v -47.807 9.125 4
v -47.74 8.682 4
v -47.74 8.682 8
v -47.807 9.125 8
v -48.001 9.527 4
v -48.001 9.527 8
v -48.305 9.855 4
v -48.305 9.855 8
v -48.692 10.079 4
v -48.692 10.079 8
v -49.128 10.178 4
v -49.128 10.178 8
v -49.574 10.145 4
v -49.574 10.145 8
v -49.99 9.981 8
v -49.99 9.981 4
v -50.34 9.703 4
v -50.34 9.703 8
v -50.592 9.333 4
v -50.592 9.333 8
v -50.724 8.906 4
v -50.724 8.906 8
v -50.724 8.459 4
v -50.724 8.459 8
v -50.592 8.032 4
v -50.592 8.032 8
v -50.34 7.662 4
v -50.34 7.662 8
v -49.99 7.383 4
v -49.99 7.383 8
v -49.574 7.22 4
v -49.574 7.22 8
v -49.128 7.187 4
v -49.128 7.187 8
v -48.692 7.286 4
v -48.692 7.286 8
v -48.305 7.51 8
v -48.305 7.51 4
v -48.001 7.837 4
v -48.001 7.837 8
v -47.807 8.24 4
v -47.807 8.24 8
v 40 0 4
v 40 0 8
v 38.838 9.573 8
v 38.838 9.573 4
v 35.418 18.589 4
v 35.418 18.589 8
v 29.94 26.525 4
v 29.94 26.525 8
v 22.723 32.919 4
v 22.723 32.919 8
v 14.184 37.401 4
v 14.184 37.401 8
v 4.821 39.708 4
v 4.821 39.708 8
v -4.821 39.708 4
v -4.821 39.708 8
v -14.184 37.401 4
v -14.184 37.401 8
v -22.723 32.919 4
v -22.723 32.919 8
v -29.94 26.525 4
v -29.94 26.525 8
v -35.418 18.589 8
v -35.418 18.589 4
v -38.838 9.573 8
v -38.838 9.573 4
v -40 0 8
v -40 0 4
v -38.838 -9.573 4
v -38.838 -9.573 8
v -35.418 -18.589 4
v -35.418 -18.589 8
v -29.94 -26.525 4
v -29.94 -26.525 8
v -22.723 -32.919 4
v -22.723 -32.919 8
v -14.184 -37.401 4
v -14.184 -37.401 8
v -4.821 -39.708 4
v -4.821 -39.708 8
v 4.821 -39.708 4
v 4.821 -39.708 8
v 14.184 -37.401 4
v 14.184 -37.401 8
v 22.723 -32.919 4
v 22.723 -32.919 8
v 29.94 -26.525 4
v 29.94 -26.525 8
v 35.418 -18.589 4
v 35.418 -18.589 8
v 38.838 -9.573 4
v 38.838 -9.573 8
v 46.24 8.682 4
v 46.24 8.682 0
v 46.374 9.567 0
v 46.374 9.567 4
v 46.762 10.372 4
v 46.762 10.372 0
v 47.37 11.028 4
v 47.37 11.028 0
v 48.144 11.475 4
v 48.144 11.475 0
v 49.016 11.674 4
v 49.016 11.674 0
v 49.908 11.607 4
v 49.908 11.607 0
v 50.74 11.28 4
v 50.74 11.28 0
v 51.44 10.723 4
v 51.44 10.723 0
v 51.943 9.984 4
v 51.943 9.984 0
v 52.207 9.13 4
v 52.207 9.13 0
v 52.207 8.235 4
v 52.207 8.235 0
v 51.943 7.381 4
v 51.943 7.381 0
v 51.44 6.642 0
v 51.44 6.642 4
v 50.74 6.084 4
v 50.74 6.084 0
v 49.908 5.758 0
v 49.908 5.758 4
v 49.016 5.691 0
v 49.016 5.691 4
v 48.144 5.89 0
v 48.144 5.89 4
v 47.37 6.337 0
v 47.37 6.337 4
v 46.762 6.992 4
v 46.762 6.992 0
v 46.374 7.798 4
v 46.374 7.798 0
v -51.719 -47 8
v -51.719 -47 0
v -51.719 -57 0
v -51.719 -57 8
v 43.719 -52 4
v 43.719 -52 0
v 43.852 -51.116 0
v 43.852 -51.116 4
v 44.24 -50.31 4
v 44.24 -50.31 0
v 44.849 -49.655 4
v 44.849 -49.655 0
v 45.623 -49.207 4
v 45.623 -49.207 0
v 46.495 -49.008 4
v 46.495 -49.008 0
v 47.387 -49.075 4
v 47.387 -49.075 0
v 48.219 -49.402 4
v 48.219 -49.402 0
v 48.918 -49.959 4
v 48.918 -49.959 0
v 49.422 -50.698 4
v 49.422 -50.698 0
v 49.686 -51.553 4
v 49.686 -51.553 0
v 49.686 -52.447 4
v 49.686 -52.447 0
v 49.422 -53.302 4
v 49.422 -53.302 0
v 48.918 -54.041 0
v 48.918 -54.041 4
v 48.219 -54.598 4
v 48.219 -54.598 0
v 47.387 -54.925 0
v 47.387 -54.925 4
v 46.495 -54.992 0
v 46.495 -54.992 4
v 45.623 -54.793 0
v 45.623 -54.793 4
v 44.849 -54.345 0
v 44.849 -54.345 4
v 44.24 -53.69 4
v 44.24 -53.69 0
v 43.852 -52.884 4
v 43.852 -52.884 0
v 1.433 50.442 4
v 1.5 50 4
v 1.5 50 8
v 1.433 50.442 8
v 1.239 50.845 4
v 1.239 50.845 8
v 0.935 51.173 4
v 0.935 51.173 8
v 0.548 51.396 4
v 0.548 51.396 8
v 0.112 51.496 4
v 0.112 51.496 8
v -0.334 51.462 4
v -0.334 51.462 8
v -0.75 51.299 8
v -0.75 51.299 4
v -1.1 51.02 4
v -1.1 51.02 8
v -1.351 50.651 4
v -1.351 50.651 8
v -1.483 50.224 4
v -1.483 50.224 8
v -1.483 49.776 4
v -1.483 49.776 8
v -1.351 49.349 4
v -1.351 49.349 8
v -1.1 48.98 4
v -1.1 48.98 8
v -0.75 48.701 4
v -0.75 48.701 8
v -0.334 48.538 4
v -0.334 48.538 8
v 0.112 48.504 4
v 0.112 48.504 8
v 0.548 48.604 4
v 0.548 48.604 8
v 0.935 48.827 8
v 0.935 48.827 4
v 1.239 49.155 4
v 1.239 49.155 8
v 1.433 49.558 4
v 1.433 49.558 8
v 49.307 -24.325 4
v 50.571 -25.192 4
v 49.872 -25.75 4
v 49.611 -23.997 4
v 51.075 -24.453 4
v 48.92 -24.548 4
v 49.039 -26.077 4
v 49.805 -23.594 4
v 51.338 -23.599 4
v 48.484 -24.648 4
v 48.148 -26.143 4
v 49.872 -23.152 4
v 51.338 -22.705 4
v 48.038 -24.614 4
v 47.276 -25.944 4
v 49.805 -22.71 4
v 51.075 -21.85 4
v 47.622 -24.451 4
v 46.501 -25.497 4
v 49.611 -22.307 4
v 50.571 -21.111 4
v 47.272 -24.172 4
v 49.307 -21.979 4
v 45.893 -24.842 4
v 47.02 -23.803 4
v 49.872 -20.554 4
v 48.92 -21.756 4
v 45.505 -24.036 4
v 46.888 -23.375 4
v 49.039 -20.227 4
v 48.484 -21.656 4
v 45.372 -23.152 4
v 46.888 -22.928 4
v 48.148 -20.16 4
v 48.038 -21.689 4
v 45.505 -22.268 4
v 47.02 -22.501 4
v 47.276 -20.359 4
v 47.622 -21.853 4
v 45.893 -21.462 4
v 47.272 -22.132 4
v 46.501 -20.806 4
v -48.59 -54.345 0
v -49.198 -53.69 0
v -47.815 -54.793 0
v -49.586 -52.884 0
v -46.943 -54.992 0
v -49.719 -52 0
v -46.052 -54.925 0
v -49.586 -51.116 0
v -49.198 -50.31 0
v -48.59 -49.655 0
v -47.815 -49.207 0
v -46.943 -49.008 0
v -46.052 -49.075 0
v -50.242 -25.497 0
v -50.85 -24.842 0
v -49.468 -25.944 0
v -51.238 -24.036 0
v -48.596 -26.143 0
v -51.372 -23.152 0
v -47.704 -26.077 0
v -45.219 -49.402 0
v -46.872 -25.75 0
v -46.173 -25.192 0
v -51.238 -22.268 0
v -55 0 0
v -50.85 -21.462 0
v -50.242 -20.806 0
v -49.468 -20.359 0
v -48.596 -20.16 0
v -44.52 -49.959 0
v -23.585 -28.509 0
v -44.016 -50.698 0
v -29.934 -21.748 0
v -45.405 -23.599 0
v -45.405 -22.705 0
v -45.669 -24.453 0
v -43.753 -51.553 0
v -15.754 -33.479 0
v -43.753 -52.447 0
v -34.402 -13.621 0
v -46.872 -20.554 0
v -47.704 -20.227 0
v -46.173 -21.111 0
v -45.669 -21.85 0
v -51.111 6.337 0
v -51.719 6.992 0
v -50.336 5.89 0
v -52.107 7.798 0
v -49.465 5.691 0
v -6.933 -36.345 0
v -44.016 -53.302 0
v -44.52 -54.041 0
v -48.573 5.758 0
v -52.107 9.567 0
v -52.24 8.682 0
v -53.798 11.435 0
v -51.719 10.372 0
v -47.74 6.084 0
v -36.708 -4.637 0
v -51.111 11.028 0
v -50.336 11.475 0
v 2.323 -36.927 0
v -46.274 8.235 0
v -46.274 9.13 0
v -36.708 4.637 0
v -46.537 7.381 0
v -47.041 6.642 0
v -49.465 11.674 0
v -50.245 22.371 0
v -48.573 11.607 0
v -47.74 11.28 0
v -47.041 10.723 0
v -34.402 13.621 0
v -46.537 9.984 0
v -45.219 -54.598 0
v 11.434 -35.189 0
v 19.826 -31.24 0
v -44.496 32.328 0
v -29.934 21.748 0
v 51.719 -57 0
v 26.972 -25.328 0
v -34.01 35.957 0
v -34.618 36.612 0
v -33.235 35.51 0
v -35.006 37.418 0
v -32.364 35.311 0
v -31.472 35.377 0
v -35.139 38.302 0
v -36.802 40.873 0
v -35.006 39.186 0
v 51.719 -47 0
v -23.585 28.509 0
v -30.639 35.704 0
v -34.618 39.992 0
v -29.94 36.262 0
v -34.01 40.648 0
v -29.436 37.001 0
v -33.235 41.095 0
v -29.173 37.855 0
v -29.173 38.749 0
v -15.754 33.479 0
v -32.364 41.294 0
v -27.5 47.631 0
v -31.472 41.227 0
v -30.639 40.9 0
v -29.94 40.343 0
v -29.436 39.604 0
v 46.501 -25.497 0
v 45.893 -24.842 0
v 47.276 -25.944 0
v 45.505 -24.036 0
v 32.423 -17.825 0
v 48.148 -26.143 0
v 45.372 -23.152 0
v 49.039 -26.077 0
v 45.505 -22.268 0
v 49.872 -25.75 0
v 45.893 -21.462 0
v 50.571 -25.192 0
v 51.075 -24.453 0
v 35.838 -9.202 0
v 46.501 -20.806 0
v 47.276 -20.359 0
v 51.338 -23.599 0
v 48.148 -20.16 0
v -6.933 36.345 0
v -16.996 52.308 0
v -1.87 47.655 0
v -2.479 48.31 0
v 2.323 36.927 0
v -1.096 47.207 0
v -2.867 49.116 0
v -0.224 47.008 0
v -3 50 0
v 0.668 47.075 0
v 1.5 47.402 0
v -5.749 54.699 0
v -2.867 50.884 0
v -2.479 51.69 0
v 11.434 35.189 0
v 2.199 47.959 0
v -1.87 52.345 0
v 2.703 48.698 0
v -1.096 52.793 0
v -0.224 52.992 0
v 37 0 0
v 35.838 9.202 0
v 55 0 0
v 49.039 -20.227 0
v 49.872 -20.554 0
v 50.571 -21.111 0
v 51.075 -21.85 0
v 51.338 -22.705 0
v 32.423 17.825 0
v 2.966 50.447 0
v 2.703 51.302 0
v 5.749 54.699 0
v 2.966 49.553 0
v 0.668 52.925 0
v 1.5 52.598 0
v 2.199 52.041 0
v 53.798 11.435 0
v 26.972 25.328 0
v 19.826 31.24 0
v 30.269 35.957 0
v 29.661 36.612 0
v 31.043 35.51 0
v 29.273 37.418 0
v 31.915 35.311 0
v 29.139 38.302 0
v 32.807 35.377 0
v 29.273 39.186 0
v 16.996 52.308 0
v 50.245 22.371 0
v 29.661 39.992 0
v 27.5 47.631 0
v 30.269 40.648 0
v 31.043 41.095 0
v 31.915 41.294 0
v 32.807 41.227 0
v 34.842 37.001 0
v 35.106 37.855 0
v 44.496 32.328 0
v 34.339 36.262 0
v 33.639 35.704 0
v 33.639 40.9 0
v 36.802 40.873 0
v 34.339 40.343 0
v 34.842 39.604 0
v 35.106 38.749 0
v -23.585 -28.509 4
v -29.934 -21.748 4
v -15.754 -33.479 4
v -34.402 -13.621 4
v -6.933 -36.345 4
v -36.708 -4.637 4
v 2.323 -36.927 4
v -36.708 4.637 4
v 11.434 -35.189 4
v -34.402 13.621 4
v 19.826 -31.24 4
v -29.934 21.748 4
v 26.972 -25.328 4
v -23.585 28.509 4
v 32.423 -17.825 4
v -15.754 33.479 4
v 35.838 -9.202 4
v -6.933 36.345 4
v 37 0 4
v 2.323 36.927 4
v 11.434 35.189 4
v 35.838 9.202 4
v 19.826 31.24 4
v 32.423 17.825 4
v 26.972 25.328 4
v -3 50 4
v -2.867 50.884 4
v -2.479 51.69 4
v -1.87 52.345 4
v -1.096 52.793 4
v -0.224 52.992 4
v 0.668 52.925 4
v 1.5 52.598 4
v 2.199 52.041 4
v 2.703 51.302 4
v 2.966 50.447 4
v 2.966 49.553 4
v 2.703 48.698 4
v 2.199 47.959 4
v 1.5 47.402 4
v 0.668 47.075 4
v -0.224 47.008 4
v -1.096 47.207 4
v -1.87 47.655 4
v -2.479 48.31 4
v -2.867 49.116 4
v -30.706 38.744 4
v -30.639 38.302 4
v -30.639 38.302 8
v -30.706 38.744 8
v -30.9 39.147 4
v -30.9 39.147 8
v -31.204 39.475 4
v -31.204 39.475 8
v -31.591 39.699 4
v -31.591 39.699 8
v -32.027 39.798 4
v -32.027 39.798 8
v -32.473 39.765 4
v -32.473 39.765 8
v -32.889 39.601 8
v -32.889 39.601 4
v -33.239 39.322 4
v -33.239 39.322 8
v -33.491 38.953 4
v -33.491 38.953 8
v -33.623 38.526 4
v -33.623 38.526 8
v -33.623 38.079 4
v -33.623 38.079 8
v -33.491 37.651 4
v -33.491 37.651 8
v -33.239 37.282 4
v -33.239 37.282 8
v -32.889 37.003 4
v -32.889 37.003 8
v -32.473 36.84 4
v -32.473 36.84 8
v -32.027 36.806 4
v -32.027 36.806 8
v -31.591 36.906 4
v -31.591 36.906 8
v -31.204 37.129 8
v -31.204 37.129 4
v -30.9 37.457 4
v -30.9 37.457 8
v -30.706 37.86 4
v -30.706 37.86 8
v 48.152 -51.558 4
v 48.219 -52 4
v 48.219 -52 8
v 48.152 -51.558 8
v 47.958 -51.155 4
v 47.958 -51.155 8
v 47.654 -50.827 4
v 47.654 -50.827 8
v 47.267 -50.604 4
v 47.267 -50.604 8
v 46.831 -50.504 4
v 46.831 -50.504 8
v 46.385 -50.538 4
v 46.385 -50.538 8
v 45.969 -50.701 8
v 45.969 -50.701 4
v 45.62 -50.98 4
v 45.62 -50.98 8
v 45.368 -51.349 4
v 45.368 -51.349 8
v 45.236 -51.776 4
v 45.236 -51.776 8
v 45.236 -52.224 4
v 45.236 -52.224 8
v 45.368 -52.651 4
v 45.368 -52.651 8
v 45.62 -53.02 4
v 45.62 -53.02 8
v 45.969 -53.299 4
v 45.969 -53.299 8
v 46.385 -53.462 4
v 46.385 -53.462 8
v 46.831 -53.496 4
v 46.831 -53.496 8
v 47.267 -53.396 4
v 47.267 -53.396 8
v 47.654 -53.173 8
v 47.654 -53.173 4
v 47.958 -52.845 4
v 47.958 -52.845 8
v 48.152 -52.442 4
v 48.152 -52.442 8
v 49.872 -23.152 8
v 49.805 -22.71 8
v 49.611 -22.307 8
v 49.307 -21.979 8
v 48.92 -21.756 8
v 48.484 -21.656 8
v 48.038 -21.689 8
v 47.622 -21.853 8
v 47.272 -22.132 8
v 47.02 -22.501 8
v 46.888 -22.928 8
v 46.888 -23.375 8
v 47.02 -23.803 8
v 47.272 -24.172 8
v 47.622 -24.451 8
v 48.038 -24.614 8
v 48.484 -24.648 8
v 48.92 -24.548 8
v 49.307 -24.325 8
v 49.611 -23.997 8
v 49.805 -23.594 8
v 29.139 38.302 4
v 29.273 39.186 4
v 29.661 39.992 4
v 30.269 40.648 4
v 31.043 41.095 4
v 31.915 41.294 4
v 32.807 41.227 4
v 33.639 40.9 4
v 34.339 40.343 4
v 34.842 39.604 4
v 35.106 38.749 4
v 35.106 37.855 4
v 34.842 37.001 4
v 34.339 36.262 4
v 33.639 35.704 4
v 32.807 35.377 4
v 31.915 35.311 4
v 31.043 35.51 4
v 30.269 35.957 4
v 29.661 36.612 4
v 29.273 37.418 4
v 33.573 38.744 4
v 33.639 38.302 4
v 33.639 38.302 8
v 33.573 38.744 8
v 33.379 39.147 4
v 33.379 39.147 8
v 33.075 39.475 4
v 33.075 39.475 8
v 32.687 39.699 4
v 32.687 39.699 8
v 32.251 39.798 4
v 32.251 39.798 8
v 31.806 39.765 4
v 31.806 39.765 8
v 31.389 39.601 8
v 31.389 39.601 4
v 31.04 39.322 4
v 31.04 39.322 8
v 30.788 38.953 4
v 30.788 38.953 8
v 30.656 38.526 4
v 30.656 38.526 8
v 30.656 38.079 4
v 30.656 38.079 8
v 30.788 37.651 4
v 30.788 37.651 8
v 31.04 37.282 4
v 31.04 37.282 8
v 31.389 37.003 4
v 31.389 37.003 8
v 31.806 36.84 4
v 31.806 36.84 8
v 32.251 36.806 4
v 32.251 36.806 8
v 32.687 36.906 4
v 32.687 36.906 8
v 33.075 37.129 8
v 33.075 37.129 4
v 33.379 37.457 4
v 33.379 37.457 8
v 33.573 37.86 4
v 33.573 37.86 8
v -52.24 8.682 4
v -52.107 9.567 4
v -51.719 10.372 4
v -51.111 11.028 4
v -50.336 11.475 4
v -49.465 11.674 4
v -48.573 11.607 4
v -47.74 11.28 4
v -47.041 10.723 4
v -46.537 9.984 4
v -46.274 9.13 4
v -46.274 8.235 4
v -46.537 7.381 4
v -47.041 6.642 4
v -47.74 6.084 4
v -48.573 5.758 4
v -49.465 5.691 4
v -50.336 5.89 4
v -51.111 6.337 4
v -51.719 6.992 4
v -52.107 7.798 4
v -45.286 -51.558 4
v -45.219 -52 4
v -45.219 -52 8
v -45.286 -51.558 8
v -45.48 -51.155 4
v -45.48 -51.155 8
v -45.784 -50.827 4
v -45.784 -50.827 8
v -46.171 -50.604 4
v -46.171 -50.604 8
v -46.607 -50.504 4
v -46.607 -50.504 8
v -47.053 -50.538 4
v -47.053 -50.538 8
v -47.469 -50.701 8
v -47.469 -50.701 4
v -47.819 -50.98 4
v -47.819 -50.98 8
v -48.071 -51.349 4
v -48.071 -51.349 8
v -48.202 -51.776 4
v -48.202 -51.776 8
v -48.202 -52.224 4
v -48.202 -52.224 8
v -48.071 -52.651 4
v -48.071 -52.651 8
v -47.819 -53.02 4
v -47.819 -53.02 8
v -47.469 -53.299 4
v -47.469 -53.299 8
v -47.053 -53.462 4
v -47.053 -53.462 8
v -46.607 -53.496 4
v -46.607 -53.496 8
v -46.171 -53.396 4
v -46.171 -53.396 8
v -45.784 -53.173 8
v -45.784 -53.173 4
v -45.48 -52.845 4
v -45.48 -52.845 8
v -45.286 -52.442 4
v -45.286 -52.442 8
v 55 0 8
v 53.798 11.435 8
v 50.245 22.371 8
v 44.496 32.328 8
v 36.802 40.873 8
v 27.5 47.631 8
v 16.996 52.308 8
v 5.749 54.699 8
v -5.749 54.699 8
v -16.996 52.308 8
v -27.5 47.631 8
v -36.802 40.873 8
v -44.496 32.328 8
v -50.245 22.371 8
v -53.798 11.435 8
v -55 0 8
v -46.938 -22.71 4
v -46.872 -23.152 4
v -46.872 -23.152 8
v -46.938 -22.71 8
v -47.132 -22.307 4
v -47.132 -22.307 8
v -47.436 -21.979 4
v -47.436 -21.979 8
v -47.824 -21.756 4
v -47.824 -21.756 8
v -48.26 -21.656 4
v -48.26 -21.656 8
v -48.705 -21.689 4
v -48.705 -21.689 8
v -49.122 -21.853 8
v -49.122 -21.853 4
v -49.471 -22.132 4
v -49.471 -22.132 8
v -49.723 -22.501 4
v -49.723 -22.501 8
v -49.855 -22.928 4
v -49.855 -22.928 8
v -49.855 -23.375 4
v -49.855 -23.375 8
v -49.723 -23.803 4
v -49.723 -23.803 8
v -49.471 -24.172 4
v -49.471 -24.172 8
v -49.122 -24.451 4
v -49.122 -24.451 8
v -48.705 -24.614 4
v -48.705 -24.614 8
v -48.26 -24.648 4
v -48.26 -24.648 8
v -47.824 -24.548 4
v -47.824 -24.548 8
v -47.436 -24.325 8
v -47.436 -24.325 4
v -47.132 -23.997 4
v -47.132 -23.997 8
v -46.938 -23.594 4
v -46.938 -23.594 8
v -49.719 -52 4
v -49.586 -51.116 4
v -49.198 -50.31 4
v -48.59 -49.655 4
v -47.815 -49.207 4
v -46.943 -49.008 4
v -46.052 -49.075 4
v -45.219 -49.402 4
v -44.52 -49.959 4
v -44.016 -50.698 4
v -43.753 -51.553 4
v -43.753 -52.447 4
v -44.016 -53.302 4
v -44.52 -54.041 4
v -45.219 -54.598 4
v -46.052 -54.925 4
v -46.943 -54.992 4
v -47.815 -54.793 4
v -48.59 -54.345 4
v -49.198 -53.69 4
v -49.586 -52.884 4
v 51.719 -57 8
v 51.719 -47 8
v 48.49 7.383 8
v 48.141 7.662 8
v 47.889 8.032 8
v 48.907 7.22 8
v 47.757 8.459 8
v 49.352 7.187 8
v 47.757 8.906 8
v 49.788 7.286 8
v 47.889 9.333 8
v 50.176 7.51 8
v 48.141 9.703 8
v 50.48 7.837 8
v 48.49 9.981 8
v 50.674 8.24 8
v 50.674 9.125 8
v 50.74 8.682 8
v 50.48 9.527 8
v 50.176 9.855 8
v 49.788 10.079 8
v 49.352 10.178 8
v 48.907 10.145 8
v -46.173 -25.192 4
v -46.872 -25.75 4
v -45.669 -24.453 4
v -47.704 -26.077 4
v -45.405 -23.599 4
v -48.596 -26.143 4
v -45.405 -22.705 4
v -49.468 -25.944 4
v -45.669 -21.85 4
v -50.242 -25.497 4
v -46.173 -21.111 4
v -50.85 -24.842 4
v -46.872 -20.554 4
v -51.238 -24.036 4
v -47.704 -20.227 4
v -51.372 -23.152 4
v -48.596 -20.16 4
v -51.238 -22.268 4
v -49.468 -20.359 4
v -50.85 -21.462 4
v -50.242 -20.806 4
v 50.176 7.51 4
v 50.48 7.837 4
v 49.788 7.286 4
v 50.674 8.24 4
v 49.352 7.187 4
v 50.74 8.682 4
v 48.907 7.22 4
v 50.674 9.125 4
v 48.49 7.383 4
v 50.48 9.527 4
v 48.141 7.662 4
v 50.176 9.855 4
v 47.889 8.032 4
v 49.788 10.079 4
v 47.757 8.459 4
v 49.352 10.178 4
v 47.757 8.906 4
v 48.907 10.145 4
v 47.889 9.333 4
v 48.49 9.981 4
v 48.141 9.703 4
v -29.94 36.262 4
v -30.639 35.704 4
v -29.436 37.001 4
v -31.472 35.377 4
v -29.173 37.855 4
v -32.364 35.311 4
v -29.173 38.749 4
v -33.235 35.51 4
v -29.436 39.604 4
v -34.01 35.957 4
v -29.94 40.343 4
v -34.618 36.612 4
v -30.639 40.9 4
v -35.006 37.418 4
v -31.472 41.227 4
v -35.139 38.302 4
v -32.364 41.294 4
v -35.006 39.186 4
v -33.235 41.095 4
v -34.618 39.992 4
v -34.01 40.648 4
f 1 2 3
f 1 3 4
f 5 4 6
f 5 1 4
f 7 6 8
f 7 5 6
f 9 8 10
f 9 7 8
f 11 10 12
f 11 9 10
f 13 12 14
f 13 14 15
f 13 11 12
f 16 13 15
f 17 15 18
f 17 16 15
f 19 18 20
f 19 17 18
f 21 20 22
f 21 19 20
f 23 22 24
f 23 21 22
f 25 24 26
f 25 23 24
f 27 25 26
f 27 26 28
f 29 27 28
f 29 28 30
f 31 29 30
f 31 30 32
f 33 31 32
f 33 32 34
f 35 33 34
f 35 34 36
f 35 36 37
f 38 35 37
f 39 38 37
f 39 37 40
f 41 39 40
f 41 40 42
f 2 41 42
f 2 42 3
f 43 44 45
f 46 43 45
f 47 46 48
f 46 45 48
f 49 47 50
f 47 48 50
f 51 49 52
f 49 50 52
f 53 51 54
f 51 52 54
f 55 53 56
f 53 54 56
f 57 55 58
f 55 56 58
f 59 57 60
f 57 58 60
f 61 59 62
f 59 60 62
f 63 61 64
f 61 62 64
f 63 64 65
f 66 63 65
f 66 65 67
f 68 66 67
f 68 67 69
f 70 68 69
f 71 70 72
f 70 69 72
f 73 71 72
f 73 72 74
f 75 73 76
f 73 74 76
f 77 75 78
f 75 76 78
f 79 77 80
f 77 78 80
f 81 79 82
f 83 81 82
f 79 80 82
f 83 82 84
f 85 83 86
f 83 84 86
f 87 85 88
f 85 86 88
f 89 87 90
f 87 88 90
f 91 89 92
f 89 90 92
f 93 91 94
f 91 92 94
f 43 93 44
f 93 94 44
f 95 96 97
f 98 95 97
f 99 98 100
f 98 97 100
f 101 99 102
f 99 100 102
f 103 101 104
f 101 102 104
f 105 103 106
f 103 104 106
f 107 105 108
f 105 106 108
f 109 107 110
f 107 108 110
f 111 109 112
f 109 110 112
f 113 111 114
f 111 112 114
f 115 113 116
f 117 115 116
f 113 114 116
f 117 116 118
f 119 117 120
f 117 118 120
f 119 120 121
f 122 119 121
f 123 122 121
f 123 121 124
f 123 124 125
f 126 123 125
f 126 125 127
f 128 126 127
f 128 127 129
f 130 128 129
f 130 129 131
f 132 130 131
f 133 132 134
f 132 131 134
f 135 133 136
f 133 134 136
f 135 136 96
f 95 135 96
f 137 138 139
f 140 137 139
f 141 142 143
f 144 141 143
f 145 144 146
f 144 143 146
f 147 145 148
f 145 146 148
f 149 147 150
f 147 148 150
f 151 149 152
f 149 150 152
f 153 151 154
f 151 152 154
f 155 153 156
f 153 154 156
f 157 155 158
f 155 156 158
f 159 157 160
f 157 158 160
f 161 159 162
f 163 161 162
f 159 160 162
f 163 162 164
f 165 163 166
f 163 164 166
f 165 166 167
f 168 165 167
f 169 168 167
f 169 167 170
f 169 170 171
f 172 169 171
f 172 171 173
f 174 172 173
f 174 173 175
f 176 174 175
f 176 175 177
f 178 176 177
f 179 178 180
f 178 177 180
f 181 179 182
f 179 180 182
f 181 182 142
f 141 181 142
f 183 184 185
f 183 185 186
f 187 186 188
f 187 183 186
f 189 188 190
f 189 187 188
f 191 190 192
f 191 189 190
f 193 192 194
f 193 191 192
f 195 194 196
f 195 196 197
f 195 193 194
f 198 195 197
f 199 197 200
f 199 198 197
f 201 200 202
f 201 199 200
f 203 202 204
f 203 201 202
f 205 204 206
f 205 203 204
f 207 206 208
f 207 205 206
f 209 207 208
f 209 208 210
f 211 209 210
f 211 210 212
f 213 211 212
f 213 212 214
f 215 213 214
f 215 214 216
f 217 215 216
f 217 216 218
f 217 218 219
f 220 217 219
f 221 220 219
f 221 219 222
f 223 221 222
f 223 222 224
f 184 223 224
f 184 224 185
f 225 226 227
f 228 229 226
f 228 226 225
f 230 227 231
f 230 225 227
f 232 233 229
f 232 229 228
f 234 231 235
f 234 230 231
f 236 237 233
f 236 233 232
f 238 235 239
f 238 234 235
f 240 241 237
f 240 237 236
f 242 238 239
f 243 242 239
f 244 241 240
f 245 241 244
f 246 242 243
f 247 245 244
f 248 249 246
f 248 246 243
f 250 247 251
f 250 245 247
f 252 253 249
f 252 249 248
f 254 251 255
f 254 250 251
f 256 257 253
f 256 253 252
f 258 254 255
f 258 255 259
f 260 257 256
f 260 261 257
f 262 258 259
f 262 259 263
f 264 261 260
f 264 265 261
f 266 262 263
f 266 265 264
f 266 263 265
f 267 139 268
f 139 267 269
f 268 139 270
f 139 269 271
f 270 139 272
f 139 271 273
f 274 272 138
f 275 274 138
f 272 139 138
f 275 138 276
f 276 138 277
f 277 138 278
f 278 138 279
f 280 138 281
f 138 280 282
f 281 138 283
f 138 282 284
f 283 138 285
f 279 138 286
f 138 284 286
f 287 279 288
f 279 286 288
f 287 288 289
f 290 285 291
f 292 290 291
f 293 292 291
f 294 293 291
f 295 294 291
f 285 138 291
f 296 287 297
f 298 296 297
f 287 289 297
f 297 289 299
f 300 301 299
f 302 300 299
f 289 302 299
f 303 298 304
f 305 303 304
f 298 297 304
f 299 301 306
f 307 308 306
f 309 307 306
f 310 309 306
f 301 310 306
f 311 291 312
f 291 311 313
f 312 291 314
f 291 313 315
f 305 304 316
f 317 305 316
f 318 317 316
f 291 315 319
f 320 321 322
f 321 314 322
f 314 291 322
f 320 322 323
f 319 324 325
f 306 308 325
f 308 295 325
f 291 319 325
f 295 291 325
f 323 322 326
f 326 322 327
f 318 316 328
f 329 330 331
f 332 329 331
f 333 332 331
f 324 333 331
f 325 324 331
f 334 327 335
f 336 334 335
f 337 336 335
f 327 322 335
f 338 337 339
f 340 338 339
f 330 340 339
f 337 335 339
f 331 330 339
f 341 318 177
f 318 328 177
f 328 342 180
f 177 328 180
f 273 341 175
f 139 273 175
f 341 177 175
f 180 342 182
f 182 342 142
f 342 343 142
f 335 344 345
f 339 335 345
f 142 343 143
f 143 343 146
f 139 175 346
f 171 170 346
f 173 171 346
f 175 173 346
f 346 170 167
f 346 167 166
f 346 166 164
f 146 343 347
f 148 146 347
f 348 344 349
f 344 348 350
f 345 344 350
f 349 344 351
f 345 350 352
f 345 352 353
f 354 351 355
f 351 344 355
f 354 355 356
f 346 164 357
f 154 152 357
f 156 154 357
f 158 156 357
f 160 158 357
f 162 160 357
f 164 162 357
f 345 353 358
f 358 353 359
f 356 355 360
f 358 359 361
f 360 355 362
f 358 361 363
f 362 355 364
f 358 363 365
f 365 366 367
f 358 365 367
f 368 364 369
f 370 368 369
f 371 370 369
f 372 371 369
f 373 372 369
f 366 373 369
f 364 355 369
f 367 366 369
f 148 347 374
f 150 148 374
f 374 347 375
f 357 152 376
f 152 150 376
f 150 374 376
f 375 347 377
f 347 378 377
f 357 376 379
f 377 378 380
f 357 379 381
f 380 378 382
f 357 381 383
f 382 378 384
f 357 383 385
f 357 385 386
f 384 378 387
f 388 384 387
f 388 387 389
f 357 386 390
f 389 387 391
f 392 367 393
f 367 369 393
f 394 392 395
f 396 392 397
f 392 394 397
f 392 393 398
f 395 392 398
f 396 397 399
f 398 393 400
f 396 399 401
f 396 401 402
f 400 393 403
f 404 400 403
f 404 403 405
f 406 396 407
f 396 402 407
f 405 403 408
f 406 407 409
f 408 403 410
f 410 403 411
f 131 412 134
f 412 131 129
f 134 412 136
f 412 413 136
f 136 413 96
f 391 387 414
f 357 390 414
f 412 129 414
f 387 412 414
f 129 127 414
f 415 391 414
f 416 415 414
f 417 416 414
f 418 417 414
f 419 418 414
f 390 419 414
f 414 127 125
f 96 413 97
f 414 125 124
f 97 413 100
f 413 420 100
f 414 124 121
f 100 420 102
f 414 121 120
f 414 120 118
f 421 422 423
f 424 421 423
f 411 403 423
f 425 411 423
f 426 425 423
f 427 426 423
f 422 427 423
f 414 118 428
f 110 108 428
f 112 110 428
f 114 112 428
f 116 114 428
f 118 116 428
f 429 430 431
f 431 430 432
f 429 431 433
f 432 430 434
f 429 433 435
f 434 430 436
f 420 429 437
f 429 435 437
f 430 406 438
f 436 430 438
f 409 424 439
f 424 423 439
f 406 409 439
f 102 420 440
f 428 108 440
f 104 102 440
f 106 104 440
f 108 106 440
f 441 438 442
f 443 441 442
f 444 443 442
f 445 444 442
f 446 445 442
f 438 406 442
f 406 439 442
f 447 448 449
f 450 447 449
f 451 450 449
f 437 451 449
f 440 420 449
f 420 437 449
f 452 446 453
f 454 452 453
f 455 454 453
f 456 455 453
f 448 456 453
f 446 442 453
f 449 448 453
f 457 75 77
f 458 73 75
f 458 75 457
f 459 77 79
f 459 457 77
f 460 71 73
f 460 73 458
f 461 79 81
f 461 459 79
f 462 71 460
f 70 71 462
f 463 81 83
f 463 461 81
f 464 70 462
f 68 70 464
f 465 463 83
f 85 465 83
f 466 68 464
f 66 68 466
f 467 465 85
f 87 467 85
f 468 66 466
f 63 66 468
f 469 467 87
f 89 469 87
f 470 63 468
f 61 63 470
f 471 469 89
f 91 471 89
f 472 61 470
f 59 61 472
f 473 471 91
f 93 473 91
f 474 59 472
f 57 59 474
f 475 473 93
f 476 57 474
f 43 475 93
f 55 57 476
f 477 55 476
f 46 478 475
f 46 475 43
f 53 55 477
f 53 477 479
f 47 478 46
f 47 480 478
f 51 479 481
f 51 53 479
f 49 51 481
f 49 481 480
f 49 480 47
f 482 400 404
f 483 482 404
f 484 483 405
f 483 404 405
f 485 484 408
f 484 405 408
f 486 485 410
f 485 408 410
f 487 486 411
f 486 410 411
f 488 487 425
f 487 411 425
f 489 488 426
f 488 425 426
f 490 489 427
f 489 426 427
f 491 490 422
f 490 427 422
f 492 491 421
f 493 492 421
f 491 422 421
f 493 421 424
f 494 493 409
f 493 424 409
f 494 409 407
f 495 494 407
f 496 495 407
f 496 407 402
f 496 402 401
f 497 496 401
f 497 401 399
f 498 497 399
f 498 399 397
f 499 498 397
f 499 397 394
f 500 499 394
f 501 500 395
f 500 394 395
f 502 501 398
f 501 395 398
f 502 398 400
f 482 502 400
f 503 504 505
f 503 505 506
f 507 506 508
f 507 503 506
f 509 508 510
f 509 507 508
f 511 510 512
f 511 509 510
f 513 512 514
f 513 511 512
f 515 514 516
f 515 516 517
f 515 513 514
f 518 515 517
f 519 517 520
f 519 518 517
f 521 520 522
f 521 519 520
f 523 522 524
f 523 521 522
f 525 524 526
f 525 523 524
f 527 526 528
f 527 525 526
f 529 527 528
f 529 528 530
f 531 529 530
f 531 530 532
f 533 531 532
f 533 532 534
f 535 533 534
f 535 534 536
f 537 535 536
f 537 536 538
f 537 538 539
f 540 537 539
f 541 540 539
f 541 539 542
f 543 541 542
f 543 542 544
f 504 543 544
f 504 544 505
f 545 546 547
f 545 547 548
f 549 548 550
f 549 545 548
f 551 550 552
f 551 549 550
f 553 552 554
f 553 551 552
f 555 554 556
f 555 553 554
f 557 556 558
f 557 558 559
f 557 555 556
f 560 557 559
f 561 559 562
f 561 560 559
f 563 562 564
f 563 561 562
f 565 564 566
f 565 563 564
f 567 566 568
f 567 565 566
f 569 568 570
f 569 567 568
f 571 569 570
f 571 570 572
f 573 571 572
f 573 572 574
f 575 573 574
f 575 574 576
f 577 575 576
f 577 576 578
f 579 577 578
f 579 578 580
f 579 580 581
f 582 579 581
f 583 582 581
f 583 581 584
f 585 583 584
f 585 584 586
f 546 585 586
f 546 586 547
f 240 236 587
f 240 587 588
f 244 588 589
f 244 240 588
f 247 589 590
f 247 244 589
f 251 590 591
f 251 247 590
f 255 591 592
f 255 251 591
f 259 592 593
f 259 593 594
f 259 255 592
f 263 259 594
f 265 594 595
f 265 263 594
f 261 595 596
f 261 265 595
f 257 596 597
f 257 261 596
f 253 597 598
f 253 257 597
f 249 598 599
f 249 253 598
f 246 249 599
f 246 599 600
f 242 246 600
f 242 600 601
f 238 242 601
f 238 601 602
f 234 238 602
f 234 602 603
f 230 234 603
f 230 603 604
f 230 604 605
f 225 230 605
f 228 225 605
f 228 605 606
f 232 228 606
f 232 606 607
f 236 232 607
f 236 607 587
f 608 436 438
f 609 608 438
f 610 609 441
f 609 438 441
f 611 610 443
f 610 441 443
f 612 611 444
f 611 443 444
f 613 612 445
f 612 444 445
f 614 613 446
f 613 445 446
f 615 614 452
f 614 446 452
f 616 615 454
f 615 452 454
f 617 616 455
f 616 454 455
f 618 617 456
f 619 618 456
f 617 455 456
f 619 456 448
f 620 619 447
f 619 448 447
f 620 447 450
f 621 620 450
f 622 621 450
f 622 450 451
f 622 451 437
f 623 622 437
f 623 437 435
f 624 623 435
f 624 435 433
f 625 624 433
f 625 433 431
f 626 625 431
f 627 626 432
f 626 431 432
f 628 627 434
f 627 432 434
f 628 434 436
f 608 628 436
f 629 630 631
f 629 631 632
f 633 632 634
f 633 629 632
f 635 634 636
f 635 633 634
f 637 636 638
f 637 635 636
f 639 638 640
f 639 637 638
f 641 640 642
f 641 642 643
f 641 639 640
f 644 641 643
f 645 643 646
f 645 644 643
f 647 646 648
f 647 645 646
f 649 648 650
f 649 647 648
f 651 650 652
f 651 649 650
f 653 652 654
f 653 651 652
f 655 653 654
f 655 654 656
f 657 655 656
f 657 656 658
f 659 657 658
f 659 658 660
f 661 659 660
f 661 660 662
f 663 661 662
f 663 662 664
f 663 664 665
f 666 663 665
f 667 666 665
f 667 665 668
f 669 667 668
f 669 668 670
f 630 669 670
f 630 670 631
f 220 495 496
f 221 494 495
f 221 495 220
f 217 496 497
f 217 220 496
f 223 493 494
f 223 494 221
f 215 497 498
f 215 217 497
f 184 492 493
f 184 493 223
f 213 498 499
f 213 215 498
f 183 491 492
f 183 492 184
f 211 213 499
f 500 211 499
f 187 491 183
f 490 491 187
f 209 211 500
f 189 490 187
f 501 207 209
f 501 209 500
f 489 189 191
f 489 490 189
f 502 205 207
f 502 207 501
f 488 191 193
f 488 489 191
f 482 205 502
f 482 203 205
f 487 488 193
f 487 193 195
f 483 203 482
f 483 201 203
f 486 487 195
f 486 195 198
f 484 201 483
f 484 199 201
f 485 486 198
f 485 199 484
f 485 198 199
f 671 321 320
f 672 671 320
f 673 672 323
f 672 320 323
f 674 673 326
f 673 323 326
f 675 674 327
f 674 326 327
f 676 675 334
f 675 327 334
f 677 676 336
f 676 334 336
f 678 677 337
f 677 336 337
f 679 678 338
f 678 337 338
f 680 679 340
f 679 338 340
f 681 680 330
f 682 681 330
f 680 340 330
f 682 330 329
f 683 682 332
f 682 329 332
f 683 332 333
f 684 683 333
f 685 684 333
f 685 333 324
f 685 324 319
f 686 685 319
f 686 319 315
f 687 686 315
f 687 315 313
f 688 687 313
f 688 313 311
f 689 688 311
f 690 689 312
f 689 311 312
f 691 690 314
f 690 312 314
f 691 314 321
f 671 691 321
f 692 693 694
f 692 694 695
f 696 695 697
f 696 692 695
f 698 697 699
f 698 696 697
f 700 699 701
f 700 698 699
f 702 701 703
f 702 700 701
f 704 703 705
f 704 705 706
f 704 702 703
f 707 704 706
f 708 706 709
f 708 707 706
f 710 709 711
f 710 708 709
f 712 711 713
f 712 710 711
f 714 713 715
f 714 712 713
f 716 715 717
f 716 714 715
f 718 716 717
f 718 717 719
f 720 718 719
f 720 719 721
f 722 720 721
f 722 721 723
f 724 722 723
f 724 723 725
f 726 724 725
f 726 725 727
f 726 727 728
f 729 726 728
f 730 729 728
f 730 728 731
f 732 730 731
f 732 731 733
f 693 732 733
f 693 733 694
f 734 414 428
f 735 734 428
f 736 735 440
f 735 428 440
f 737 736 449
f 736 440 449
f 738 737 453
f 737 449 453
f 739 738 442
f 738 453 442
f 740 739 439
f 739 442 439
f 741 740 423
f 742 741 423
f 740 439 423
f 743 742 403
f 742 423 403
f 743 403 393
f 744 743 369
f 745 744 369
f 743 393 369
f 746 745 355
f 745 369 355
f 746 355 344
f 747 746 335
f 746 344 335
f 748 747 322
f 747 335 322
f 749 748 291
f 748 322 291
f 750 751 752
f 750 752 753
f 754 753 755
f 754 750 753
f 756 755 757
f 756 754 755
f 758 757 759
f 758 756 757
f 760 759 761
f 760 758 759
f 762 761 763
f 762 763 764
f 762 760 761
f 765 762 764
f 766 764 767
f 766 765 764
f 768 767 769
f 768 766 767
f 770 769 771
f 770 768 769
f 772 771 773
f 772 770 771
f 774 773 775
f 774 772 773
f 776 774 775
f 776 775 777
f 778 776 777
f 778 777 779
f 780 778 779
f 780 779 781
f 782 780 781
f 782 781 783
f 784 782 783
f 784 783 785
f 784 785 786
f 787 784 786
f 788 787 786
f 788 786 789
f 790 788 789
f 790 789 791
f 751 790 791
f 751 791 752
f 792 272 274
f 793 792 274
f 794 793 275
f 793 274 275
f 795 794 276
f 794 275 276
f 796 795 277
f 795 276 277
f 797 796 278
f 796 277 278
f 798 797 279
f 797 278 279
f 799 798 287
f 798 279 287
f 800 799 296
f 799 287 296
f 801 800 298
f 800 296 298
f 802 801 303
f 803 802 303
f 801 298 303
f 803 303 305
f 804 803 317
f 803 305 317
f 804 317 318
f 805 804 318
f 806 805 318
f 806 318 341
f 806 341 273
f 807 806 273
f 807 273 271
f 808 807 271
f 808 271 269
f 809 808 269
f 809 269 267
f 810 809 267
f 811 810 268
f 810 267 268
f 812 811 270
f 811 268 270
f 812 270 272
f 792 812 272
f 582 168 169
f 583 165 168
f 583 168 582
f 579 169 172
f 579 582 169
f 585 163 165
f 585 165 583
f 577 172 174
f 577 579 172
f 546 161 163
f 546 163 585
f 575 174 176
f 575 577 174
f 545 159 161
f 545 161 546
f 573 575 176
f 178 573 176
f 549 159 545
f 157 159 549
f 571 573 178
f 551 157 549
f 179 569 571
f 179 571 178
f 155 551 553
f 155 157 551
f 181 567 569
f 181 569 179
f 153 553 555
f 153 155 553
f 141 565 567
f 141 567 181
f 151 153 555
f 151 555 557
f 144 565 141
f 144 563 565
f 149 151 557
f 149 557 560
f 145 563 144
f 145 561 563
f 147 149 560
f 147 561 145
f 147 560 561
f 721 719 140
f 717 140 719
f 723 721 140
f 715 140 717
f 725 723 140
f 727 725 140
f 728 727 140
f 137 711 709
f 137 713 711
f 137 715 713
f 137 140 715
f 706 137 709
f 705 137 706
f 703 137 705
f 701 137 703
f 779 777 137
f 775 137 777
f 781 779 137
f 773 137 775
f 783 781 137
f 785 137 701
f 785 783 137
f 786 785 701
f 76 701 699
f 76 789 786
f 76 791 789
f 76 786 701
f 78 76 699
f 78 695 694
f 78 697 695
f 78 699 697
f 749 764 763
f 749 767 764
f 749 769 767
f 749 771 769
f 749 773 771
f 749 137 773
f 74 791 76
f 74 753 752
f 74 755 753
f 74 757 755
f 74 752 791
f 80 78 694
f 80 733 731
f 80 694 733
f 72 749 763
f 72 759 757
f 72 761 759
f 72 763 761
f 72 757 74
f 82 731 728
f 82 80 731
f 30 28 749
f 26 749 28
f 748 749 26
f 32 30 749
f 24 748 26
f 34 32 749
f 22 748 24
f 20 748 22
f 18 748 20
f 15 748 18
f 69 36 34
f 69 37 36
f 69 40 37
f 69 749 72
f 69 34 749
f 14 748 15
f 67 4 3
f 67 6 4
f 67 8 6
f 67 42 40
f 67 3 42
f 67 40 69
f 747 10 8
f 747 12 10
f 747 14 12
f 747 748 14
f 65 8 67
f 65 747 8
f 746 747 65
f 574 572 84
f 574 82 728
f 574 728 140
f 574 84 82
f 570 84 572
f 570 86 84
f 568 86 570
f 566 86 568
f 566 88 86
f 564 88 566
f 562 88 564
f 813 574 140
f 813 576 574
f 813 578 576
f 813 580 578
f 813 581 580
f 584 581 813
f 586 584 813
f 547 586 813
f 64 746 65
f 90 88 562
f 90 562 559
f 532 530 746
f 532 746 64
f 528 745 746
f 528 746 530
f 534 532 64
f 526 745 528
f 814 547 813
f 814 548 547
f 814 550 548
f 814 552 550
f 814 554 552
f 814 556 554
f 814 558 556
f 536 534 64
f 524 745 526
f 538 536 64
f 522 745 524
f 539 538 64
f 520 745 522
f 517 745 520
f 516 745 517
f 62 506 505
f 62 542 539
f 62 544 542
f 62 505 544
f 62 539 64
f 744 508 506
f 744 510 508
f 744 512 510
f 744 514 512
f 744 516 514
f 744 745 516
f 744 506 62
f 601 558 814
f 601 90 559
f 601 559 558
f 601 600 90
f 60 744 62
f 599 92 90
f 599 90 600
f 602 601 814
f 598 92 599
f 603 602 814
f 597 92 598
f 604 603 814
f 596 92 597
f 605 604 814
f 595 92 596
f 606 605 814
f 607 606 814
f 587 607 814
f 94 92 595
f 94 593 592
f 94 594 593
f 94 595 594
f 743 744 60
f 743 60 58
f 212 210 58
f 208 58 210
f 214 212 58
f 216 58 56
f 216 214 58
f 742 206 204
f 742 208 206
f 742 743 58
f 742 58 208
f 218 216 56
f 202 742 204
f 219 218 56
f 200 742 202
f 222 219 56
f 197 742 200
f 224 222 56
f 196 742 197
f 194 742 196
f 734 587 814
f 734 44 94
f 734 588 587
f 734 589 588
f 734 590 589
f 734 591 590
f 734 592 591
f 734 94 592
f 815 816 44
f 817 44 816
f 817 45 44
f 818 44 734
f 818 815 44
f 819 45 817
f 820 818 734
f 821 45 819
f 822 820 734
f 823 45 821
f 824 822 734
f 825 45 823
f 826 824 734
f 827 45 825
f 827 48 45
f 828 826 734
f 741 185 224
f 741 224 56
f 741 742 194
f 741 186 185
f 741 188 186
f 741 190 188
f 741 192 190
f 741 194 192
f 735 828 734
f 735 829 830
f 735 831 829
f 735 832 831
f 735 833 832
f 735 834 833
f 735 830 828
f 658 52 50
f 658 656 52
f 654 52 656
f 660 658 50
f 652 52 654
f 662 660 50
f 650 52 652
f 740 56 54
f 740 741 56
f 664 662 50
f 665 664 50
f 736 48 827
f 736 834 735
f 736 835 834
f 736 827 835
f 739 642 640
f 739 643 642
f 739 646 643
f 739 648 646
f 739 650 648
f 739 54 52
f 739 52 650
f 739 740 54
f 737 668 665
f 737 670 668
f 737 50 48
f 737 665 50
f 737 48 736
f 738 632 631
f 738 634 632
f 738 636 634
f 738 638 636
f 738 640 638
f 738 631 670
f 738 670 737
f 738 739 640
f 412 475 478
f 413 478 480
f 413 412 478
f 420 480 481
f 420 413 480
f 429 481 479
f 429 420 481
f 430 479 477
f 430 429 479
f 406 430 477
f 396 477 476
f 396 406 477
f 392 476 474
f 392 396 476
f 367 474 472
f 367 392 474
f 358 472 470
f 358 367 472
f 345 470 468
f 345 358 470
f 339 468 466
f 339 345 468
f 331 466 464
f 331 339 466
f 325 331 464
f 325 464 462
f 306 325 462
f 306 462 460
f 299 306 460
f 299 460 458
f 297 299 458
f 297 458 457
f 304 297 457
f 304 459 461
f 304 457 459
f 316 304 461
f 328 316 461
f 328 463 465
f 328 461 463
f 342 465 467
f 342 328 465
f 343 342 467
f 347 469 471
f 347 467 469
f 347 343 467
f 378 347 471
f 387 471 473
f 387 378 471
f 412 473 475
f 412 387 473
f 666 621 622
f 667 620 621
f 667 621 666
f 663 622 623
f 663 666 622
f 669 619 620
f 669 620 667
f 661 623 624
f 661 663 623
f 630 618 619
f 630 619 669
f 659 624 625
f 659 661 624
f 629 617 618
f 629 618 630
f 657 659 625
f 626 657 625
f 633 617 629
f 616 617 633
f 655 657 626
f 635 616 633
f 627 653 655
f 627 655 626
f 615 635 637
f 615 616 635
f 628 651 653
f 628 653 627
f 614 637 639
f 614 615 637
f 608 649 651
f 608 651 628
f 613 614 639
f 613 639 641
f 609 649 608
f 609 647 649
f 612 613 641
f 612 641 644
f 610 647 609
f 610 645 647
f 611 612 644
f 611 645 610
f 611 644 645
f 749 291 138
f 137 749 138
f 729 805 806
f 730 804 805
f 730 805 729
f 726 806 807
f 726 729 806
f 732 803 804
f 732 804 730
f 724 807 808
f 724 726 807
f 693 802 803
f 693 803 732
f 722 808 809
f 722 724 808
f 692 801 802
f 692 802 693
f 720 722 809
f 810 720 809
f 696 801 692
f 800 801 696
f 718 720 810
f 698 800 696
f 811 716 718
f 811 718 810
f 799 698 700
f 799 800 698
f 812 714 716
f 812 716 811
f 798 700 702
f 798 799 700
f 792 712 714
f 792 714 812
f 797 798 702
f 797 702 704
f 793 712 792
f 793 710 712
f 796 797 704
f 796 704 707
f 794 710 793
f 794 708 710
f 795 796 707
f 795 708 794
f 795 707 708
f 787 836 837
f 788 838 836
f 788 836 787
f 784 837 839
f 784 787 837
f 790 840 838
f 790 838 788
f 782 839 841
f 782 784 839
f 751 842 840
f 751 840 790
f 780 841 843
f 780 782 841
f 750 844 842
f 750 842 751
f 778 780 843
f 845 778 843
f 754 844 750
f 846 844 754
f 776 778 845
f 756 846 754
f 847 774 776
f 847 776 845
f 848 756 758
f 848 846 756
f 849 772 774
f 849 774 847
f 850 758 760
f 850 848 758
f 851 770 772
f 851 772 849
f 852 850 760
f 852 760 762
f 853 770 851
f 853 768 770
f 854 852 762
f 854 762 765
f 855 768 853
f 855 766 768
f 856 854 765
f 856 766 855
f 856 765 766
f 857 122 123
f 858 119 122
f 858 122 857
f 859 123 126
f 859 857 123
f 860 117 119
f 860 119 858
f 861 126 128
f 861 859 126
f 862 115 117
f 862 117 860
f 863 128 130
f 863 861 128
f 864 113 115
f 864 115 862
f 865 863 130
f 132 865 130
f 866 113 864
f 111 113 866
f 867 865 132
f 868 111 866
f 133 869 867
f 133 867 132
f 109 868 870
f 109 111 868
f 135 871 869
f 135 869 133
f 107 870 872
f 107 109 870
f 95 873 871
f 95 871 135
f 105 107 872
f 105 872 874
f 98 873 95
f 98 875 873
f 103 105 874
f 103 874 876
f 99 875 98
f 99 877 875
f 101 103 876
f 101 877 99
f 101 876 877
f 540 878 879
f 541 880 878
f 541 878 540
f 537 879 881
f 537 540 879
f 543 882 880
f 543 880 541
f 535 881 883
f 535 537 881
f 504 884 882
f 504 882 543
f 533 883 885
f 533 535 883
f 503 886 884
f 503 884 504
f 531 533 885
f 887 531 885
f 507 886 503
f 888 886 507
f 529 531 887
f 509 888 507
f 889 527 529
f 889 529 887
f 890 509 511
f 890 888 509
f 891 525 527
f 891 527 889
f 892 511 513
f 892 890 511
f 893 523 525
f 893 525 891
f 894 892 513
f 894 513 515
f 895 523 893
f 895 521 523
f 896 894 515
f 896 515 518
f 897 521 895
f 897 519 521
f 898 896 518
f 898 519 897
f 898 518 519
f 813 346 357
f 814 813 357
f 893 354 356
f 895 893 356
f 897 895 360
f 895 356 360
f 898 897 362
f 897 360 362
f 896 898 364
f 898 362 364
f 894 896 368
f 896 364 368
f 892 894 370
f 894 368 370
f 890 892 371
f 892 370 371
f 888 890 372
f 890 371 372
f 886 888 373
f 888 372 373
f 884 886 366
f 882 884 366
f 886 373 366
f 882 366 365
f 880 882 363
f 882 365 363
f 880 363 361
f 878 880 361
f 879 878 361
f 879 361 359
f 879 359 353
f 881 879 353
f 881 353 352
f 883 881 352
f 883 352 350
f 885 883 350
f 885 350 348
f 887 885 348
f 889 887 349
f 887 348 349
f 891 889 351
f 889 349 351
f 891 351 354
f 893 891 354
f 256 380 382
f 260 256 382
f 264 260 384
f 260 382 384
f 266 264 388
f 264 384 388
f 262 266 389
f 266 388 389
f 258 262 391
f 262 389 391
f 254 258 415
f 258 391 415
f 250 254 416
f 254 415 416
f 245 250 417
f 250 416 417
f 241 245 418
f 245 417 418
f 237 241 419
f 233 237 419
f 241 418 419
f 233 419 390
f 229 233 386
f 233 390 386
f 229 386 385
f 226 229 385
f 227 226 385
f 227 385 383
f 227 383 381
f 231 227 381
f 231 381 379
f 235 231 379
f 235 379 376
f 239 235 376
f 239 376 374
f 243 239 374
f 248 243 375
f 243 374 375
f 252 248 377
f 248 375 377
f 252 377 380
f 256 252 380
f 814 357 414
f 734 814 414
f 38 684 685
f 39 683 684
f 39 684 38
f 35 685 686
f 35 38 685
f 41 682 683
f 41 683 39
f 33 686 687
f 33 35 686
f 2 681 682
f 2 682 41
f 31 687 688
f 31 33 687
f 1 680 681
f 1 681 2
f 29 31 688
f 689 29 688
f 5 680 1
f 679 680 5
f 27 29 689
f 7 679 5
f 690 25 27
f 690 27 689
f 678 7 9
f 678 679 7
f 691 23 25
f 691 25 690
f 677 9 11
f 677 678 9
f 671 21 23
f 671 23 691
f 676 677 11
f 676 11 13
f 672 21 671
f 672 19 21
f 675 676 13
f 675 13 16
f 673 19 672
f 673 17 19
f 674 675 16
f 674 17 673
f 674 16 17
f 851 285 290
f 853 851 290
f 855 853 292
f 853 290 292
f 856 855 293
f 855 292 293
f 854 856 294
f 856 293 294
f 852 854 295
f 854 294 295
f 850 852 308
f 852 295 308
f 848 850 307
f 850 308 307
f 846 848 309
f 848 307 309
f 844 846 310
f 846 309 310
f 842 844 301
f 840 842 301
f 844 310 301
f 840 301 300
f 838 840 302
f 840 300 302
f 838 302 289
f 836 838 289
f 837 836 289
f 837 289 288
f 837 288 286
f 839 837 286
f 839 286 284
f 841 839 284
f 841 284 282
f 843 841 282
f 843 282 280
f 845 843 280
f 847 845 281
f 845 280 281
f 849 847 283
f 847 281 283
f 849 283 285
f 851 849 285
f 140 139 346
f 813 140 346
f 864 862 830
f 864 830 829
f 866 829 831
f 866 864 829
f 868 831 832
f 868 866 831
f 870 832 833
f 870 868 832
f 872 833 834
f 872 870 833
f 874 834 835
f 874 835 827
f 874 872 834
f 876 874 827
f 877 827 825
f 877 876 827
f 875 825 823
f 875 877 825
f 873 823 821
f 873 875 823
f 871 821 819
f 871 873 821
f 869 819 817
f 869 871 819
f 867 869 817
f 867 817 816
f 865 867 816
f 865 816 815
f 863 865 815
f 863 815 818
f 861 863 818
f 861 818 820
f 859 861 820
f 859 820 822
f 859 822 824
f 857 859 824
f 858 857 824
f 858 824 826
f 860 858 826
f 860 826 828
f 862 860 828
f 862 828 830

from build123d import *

# Parameters (mm, degrees)
SKETCH1_R           = 40
SKETCH1_R_2         = 1.5
SKETCH1_R_3         = 37
BOSS_EXTRUDE1_DEPTH = 8
SKETCH3_R           = 40
CUT_EXTRUDE1_DEPTH  = 4
SKETCH4_R           = 3
SKETCH4_R_2         = 1.5
CUT_EXTRUDE2_DEPTH  = 4


with BuildPart() as part:
    # Sketch1 → Boss-Extrude1 (new body)
    # profile 1 of 2: a face of its own
    with BuildSketch(Plane.XY):
        with BuildLine():
            Line((51.719126793, -47), (55, 0))
            ThreePointArc((55, 0), (0, 55), (-55, 0))
            Line((-55, 0), (-51.719126793, -47))
            Line((-51.719126793, -47), (-51.719126793, -57))
            Line((-51.719126793, -57), (-41.694792144, -57))
            Line((-41.694792144, -57), (41.694792144, -57))
            Line((41.694792144, -57), (51.719126793, -57))
            Line((51.719126793, -57), (51.719126793, -47))
        make_face()
        Circle(SKETCH1_R, mode=Mode.SUBTRACT)
        with Locations((46.719126793, -52)):
            Circle(SKETCH1_R_2, mode=Mode.SUBTRACT)
        with Locations((48.371701184, -23.151818224)):
            Circle(SKETCH1_R_2, mode=Mode.SUBTRACT)
        with Locations((49.240387651, 8.682408883)):
            Circle(SKETCH1_R_2, mode=Mode.SUBTRACT)
        with Locations((32.139380484, 38.302222156)):
            Circle(SKETCH1_R_2, mode=Mode.SUBTRACT)
        with Locations((0, 50)):
            Circle(SKETCH1_R_2, mode=Mode.SUBTRACT)
        with Locations((-32.139380484, 38.302222156)):
            Circle(SKETCH1_R_2, mode=Mode.SUBTRACT)
        with Locations((-49.240387651, 8.682408883)):
            Circle(SKETCH1_R_2, mode=Mode.SUBTRACT)
        with Locations((-48.371701184, -23.151818224)):
            Circle(SKETCH1_R_2, mode=Mode.SUBTRACT)
        with Locations((-46.719126793, -52)):
            Circle(SKETCH1_R_2, mode=Mode.SUBTRACT)
    # profile 2 of 2: a face of its own
    with BuildSketch(Plane.XY):
        Circle(SKETCH1_R)
        Circle(SKETCH1_R_3, mode=Mode.SUBTRACT)
    extrude(amount=BOSS_EXTRUDE1_DEPTH)

    # Sketch3 → Cut-Extrude1 (cut)
    with BuildSketch(Plane.XY.offset(8)):
        Circle(SKETCH3_R)
    extrude(amount=-CUT_EXTRUDE1_DEPTH, mode=Mode.SUBTRACT)

    # Sketch4 → Cut-Extrude2 (cut)
    # profile 1 of 9: a face of its own
    with BuildSketch(Plane(origin=(0, 0, 0), x_dir=(-1, 0, 0), z_dir=(0, 0, -1))):
        with Locations((-46.719126793, -52)):
            Circle(SKETCH4_R)
        with Locations((-46.719126793, -52)):
            Circle(SKETCH4_R_2, mode=Mode.SUBTRACT)
    # profile 2 of 9: a face of its own
    with BuildSketch(Plane(origin=(0, 0, 0), x_dir=(-1, 0, 0), z_dir=(0, 0, -1))):
        with Locations((-48.371701184, -23.151818224)):
            Circle(SKETCH4_R)
        with Locations((-48.371701184, -23.151818224)):
            Circle(SKETCH4_R_2, mode=Mode.SUBTRACT)
    # profile 3 of 9: a face of its own
    with BuildSketch(Plane(origin=(0, 0, 0), x_dir=(-1, 0, 0), z_dir=(0, 0, -1))):
        with Locations((-49.240387651, 8.682408883)):
            Circle(SKETCH4_R)
        with Locations((-49.240387651, 8.682408883)):
            Circle(SKETCH4_R_2, mode=Mode.SUBTRACT)
    # profile 4 of 9: a face of its own
    with BuildSketch(Plane(origin=(0, 0, 0), x_dir=(-1, 0, 0), z_dir=(0, 0, -1))):
        with Locations((-32.139380484, 38.302222156)):
            Circle(SKETCH4_R)
        with Locations((-32.139380484, 38.302222156)):
            Circle(SKETCH4_R_2, mode=Mode.SUBTRACT)
    # profile 5 of 9: a face of its own
    with BuildSketch(Plane(origin=(0, 0, 0), x_dir=(-1, 0, 0), z_dir=(0, 0, -1))):
        with Locations((0, 50)):
            Circle(SKETCH4_R)
        with Locations((0, 50)):
            Circle(SKETCH4_R_2, mode=Mode.SUBTRACT)
    # profile 6 of 9: a face of its own
    with BuildSketch(Plane(origin=(0, 0, 0), x_dir=(-1, 0, 0), z_dir=(0, 0, -1))):
        with Locations((32.139380484, 38.302222156)):
            Circle(SKETCH4_R)
        with Locations((32.139380484, 38.302222156)):
            Circle(SKETCH4_R_2, mode=Mode.SUBTRACT)
    # profile 7 of 9: a face of its own
    with BuildSketch(Plane(origin=(0, 0, 0), x_dir=(-1, 0, 0), z_dir=(0, 0, -1))):
        with Locations((49.240387651, 8.682408883)):
            Circle(SKETCH4_R)
        with Locations((49.240387651, 8.682408883)):
            Circle(SKETCH4_R_2, mode=Mode.SUBTRACT)
    # profile 8 of 9: a face of its own
    with BuildSketch(Plane(origin=(0, 0, 0), x_dir=(-1, 0, 0), z_dir=(0, 0, -1))):
        with Locations((48.371701184, -23.151818224)):
            Circle(SKETCH4_R)
        with Locations((48.371701184, -23.151818224)):
            Circle(SKETCH4_R_2, mode=Mode.SUBTRACT)
    # profile 9 of 9: a face of its own
    with BuildSketch(Plane(origin=(0, 0, 0), x_dir=(-1, 0, 0), z_dir=(0, 0, -1))):
        with Locations((46.719126793, -52)):
            Circle(SKETCH4_R)
        with Locations((46.719126793, -52)):
            Circle(SKETCH4_R_2, mode=Mode.SUBTRACT)
    extrude(amount=-CUT_EXTRUDE2_DEPTH, mode=Mode.SUBTRACT)


solid = part.part
